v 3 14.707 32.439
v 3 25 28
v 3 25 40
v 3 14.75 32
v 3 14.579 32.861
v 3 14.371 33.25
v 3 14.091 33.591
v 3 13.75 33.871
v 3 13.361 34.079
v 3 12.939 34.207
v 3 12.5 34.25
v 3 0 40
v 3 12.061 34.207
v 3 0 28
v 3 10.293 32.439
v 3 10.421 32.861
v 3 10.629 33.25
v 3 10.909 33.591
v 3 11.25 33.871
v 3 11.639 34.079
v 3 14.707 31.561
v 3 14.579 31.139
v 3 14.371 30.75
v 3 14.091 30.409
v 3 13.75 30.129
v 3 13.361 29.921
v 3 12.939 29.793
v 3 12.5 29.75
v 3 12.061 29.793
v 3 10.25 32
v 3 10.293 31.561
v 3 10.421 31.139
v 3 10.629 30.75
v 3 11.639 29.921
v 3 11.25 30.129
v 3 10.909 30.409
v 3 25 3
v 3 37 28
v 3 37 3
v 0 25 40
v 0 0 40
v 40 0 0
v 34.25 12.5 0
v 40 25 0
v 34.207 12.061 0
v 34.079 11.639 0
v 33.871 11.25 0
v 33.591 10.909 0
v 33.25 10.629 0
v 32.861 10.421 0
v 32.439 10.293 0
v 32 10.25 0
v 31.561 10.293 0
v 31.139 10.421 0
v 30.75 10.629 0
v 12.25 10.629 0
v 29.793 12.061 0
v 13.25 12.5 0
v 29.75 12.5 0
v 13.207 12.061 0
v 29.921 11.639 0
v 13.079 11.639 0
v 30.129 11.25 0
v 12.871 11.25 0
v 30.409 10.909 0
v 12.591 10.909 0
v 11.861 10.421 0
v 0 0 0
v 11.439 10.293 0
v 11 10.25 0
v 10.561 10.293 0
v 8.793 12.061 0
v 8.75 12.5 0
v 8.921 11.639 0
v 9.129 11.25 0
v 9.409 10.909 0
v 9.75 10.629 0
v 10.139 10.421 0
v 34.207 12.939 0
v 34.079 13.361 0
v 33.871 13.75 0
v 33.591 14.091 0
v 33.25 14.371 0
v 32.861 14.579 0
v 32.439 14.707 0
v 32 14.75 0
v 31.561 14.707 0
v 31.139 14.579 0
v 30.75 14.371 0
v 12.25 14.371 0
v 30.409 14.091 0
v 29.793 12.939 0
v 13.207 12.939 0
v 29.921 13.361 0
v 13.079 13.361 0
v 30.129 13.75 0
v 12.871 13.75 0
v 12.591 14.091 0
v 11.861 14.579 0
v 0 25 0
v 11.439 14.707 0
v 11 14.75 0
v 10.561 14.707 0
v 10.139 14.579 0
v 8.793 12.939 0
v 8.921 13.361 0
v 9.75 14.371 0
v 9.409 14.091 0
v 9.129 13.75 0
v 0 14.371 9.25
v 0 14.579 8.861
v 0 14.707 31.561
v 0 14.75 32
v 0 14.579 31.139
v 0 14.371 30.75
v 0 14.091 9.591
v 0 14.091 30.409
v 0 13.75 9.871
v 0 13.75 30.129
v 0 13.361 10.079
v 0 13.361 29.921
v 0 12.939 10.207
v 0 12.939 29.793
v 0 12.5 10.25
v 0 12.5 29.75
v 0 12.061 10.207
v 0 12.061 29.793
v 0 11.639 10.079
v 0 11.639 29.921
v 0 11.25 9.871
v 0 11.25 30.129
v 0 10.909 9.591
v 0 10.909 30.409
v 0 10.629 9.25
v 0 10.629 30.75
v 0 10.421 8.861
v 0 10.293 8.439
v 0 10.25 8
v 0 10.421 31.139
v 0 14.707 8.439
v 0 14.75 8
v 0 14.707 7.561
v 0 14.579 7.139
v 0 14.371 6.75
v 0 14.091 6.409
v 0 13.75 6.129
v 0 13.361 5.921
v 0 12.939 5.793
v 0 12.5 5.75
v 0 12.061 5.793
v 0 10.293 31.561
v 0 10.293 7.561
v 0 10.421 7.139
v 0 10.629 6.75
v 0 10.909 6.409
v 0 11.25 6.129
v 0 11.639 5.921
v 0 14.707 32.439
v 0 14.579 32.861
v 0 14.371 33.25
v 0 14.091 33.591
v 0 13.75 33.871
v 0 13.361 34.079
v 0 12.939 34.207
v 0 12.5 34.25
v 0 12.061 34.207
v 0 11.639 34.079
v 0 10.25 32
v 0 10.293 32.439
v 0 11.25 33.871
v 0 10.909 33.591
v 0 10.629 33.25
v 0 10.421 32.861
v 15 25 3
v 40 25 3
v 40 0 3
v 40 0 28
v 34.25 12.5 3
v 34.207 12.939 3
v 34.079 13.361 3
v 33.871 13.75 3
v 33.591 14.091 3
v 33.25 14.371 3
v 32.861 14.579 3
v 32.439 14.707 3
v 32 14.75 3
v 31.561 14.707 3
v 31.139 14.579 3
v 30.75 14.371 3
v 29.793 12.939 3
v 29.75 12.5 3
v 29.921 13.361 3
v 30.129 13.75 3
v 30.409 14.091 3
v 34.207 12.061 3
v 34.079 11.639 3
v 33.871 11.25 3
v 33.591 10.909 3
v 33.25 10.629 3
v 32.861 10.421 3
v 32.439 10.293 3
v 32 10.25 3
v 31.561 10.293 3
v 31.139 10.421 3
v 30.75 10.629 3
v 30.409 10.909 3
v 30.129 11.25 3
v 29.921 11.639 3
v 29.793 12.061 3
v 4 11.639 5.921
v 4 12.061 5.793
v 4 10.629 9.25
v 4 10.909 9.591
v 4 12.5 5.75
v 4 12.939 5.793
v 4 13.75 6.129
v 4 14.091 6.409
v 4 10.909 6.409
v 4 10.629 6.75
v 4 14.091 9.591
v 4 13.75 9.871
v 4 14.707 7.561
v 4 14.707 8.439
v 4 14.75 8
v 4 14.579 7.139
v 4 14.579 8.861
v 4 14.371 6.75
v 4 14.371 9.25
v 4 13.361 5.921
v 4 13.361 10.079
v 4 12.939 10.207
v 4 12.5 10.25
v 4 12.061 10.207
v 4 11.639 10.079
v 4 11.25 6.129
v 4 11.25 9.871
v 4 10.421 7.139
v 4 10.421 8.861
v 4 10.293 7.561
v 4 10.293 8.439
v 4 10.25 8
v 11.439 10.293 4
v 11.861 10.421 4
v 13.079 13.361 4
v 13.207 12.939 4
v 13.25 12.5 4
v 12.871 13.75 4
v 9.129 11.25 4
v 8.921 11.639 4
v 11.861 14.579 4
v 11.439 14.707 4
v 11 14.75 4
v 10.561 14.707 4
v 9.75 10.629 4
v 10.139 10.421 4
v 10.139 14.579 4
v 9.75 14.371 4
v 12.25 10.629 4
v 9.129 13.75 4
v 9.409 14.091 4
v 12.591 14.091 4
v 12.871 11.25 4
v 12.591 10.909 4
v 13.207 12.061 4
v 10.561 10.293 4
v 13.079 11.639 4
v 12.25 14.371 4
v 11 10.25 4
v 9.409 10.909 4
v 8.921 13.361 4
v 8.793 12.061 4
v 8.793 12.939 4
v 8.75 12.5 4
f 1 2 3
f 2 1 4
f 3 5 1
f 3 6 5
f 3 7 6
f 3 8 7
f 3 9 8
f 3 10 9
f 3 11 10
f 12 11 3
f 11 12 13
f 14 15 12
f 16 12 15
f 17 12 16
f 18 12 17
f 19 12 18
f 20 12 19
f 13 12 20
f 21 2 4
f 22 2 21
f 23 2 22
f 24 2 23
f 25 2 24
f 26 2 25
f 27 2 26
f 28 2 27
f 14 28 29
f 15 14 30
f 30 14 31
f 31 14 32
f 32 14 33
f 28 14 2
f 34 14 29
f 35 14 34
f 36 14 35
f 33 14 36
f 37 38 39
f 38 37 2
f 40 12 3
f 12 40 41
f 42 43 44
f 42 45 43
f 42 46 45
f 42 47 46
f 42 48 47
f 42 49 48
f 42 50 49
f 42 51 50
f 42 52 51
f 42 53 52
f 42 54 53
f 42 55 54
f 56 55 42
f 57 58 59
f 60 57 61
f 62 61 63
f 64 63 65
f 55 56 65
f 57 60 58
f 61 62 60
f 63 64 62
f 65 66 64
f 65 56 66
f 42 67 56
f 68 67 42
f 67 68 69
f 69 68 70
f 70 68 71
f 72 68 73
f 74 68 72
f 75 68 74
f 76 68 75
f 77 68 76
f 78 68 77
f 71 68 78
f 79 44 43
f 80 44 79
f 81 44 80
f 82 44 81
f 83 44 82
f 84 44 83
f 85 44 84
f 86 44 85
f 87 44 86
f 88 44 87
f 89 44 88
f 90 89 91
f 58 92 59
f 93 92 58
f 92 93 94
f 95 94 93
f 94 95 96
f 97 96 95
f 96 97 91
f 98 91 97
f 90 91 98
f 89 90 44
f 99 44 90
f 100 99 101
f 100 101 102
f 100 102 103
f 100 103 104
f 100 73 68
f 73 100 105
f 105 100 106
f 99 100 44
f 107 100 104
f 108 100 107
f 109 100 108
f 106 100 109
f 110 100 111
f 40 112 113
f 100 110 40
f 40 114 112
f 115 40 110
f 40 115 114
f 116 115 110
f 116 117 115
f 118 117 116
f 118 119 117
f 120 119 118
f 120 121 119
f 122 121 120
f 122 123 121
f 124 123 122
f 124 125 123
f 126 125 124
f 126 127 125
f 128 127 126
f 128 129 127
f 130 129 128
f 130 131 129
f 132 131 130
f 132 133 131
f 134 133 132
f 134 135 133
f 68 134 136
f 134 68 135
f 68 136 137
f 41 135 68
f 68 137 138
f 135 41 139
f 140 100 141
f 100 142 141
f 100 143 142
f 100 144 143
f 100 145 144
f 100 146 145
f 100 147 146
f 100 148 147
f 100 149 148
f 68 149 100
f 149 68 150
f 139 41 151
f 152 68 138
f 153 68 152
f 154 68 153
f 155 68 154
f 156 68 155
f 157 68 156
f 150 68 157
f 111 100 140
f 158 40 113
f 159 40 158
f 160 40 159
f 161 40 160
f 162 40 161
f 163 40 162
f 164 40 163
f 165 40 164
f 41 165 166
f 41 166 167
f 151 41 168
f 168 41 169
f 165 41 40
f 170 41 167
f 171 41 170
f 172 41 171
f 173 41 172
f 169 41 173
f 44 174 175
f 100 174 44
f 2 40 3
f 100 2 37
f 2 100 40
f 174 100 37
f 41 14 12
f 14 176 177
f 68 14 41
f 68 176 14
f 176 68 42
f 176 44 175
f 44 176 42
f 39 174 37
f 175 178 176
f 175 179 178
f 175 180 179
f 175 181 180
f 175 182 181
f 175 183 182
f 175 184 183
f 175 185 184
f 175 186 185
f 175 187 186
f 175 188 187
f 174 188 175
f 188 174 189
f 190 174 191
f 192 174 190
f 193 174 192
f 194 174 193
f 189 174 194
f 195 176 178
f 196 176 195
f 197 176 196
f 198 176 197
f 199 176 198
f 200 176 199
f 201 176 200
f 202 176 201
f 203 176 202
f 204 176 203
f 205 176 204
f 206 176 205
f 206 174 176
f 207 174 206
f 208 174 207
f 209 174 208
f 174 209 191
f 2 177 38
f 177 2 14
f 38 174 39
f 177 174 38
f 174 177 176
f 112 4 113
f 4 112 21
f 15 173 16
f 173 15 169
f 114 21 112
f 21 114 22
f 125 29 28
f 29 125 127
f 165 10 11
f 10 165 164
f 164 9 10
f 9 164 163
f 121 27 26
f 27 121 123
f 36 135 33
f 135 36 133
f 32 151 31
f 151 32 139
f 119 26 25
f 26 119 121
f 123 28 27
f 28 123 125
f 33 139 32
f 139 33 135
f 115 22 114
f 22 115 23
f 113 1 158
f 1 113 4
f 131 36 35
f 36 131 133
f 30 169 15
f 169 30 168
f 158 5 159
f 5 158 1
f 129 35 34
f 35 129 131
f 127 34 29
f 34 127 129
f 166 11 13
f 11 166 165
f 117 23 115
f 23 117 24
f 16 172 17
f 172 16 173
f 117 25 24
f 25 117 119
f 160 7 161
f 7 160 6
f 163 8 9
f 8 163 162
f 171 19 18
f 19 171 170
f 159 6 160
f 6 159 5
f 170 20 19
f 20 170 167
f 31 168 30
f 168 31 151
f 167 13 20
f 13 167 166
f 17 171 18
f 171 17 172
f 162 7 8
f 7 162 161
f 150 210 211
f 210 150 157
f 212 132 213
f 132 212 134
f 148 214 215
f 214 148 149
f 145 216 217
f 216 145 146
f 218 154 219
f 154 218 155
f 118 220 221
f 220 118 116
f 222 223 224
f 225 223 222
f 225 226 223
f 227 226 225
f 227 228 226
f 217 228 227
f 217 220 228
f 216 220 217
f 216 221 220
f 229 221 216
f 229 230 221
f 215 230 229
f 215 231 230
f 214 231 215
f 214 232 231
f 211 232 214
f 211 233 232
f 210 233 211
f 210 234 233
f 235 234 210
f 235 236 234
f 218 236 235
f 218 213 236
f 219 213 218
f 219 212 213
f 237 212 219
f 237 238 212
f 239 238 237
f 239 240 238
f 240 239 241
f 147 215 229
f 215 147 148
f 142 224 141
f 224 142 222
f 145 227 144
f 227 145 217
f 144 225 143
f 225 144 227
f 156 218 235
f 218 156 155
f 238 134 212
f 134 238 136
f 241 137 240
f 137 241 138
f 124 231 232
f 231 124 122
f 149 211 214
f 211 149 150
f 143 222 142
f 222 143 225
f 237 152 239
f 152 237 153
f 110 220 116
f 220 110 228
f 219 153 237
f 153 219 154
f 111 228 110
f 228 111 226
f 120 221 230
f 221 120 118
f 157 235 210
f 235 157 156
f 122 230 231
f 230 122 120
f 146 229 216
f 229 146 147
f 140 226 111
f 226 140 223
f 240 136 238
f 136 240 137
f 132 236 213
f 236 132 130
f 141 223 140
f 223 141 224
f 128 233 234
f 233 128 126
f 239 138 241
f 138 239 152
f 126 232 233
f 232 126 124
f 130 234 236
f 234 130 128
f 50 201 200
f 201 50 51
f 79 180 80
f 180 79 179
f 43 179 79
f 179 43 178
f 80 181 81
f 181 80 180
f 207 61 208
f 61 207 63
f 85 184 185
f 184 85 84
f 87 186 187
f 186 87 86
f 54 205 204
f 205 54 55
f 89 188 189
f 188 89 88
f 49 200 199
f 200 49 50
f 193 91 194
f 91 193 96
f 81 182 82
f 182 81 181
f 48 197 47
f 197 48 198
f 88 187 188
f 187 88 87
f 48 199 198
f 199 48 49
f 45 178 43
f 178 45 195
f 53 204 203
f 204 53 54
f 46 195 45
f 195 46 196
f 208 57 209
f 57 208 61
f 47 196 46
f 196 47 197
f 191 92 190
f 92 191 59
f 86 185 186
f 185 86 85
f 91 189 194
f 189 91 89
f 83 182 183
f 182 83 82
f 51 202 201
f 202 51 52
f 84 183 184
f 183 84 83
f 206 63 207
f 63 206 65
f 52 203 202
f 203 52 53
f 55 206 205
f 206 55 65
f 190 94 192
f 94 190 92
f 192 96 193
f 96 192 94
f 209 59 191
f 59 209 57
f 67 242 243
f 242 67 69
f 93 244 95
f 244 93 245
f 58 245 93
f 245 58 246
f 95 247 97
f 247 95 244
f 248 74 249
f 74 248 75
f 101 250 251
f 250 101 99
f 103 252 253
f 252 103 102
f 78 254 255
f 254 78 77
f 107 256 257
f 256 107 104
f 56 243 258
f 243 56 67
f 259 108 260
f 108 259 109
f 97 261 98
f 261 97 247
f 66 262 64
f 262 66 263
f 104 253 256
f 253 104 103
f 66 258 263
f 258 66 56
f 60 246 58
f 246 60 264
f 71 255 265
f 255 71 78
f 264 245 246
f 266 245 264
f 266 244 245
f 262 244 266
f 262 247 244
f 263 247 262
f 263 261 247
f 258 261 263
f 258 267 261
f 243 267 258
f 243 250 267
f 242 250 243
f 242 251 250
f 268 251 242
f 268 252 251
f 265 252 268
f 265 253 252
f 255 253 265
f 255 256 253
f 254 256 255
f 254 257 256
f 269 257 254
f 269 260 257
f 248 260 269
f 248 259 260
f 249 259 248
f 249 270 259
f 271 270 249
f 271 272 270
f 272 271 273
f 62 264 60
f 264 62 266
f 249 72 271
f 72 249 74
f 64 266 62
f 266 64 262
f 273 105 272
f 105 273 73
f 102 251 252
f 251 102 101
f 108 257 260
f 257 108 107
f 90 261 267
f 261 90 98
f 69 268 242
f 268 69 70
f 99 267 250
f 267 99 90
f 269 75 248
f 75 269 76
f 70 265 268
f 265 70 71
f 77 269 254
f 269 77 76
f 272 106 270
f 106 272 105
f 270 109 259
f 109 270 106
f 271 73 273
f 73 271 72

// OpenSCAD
// ============================================================
//  bracket_parametric.scad
//  Off-Grid 3D Print Library - Parametric Mounting Bracket
//  License: CC0 Public Domain
//  Recommended material: PETG or ASA for outdoor use
// ============================================================

/* [Main Dimensions] */
arm_h       = 40;   // Vertical arm height (mm)
arm_w       = 40;   // Horizontal arm width (mm)
depth       = 25;   // Bracket depth (mm)
thick       = 3;    // Wall thickness (mm)

/* [Gusset] */
gusset      = true;     // Add diagonal gusset?
gusset_t    = 3;        // Gusset thickness (mm)

/* [Mounting Holes] */
add_holes   = true;     // Drill mounting holes?
hole_d      = 4.5;      // Hole diameter - 4.5mm passes M4 bolt
hole_margin = 8;        // Distance from edge to hole center (mm)

/* [Render] */
$fn = 32;

module rounded_rect(w, d, h, r=2) {
    hull() {
        for (xx = [r, w-r])
            for (yy = [r, d-r])
                translate([xx, yy, 0]) cylinder(r=r, h=h);
    }
}

module bracket_body() {
    union() {
        cube([thick, depth, arm_h]);        // vertical arm
        cube([arm_w,  depth, thick]);       // horizontal arm
        if (gusset) {
            translate([thick, 0, thick])
                rotate([0, 0, 0])
                linear_extrude(depth)
                    polygon([[0,0],[arm_w-thick,0],[0,arm_h-thick]]);
        }
    }
}

module bracket() {
    difference() {
        bracket_body();
        if (add_holes) {
            // Vertical arm hole
            translate([thick/2, depth/2, arm_h - hole_margin])
                rotate([0, 90, 0])
                    cylinder(d=hole_d, h=thick+2, center=true);
            translate([thick/2, depth/2, hole_margin])
                rotate([0, 90, 0])
                    cylinder(d=hole_d, h=thick+2, center=true);
            // Horizontal arm holes
            translate([arm_w - hole_margin, depth/2, thick/2])
                cylinder(d=hole_d, h=thick+2, center=true);
            translate([hole_margin + thick, depth/2, thick/2])
                cylinder(d=hole_d, h=thick+2, center=true);
        }
    }
}

bracket();
